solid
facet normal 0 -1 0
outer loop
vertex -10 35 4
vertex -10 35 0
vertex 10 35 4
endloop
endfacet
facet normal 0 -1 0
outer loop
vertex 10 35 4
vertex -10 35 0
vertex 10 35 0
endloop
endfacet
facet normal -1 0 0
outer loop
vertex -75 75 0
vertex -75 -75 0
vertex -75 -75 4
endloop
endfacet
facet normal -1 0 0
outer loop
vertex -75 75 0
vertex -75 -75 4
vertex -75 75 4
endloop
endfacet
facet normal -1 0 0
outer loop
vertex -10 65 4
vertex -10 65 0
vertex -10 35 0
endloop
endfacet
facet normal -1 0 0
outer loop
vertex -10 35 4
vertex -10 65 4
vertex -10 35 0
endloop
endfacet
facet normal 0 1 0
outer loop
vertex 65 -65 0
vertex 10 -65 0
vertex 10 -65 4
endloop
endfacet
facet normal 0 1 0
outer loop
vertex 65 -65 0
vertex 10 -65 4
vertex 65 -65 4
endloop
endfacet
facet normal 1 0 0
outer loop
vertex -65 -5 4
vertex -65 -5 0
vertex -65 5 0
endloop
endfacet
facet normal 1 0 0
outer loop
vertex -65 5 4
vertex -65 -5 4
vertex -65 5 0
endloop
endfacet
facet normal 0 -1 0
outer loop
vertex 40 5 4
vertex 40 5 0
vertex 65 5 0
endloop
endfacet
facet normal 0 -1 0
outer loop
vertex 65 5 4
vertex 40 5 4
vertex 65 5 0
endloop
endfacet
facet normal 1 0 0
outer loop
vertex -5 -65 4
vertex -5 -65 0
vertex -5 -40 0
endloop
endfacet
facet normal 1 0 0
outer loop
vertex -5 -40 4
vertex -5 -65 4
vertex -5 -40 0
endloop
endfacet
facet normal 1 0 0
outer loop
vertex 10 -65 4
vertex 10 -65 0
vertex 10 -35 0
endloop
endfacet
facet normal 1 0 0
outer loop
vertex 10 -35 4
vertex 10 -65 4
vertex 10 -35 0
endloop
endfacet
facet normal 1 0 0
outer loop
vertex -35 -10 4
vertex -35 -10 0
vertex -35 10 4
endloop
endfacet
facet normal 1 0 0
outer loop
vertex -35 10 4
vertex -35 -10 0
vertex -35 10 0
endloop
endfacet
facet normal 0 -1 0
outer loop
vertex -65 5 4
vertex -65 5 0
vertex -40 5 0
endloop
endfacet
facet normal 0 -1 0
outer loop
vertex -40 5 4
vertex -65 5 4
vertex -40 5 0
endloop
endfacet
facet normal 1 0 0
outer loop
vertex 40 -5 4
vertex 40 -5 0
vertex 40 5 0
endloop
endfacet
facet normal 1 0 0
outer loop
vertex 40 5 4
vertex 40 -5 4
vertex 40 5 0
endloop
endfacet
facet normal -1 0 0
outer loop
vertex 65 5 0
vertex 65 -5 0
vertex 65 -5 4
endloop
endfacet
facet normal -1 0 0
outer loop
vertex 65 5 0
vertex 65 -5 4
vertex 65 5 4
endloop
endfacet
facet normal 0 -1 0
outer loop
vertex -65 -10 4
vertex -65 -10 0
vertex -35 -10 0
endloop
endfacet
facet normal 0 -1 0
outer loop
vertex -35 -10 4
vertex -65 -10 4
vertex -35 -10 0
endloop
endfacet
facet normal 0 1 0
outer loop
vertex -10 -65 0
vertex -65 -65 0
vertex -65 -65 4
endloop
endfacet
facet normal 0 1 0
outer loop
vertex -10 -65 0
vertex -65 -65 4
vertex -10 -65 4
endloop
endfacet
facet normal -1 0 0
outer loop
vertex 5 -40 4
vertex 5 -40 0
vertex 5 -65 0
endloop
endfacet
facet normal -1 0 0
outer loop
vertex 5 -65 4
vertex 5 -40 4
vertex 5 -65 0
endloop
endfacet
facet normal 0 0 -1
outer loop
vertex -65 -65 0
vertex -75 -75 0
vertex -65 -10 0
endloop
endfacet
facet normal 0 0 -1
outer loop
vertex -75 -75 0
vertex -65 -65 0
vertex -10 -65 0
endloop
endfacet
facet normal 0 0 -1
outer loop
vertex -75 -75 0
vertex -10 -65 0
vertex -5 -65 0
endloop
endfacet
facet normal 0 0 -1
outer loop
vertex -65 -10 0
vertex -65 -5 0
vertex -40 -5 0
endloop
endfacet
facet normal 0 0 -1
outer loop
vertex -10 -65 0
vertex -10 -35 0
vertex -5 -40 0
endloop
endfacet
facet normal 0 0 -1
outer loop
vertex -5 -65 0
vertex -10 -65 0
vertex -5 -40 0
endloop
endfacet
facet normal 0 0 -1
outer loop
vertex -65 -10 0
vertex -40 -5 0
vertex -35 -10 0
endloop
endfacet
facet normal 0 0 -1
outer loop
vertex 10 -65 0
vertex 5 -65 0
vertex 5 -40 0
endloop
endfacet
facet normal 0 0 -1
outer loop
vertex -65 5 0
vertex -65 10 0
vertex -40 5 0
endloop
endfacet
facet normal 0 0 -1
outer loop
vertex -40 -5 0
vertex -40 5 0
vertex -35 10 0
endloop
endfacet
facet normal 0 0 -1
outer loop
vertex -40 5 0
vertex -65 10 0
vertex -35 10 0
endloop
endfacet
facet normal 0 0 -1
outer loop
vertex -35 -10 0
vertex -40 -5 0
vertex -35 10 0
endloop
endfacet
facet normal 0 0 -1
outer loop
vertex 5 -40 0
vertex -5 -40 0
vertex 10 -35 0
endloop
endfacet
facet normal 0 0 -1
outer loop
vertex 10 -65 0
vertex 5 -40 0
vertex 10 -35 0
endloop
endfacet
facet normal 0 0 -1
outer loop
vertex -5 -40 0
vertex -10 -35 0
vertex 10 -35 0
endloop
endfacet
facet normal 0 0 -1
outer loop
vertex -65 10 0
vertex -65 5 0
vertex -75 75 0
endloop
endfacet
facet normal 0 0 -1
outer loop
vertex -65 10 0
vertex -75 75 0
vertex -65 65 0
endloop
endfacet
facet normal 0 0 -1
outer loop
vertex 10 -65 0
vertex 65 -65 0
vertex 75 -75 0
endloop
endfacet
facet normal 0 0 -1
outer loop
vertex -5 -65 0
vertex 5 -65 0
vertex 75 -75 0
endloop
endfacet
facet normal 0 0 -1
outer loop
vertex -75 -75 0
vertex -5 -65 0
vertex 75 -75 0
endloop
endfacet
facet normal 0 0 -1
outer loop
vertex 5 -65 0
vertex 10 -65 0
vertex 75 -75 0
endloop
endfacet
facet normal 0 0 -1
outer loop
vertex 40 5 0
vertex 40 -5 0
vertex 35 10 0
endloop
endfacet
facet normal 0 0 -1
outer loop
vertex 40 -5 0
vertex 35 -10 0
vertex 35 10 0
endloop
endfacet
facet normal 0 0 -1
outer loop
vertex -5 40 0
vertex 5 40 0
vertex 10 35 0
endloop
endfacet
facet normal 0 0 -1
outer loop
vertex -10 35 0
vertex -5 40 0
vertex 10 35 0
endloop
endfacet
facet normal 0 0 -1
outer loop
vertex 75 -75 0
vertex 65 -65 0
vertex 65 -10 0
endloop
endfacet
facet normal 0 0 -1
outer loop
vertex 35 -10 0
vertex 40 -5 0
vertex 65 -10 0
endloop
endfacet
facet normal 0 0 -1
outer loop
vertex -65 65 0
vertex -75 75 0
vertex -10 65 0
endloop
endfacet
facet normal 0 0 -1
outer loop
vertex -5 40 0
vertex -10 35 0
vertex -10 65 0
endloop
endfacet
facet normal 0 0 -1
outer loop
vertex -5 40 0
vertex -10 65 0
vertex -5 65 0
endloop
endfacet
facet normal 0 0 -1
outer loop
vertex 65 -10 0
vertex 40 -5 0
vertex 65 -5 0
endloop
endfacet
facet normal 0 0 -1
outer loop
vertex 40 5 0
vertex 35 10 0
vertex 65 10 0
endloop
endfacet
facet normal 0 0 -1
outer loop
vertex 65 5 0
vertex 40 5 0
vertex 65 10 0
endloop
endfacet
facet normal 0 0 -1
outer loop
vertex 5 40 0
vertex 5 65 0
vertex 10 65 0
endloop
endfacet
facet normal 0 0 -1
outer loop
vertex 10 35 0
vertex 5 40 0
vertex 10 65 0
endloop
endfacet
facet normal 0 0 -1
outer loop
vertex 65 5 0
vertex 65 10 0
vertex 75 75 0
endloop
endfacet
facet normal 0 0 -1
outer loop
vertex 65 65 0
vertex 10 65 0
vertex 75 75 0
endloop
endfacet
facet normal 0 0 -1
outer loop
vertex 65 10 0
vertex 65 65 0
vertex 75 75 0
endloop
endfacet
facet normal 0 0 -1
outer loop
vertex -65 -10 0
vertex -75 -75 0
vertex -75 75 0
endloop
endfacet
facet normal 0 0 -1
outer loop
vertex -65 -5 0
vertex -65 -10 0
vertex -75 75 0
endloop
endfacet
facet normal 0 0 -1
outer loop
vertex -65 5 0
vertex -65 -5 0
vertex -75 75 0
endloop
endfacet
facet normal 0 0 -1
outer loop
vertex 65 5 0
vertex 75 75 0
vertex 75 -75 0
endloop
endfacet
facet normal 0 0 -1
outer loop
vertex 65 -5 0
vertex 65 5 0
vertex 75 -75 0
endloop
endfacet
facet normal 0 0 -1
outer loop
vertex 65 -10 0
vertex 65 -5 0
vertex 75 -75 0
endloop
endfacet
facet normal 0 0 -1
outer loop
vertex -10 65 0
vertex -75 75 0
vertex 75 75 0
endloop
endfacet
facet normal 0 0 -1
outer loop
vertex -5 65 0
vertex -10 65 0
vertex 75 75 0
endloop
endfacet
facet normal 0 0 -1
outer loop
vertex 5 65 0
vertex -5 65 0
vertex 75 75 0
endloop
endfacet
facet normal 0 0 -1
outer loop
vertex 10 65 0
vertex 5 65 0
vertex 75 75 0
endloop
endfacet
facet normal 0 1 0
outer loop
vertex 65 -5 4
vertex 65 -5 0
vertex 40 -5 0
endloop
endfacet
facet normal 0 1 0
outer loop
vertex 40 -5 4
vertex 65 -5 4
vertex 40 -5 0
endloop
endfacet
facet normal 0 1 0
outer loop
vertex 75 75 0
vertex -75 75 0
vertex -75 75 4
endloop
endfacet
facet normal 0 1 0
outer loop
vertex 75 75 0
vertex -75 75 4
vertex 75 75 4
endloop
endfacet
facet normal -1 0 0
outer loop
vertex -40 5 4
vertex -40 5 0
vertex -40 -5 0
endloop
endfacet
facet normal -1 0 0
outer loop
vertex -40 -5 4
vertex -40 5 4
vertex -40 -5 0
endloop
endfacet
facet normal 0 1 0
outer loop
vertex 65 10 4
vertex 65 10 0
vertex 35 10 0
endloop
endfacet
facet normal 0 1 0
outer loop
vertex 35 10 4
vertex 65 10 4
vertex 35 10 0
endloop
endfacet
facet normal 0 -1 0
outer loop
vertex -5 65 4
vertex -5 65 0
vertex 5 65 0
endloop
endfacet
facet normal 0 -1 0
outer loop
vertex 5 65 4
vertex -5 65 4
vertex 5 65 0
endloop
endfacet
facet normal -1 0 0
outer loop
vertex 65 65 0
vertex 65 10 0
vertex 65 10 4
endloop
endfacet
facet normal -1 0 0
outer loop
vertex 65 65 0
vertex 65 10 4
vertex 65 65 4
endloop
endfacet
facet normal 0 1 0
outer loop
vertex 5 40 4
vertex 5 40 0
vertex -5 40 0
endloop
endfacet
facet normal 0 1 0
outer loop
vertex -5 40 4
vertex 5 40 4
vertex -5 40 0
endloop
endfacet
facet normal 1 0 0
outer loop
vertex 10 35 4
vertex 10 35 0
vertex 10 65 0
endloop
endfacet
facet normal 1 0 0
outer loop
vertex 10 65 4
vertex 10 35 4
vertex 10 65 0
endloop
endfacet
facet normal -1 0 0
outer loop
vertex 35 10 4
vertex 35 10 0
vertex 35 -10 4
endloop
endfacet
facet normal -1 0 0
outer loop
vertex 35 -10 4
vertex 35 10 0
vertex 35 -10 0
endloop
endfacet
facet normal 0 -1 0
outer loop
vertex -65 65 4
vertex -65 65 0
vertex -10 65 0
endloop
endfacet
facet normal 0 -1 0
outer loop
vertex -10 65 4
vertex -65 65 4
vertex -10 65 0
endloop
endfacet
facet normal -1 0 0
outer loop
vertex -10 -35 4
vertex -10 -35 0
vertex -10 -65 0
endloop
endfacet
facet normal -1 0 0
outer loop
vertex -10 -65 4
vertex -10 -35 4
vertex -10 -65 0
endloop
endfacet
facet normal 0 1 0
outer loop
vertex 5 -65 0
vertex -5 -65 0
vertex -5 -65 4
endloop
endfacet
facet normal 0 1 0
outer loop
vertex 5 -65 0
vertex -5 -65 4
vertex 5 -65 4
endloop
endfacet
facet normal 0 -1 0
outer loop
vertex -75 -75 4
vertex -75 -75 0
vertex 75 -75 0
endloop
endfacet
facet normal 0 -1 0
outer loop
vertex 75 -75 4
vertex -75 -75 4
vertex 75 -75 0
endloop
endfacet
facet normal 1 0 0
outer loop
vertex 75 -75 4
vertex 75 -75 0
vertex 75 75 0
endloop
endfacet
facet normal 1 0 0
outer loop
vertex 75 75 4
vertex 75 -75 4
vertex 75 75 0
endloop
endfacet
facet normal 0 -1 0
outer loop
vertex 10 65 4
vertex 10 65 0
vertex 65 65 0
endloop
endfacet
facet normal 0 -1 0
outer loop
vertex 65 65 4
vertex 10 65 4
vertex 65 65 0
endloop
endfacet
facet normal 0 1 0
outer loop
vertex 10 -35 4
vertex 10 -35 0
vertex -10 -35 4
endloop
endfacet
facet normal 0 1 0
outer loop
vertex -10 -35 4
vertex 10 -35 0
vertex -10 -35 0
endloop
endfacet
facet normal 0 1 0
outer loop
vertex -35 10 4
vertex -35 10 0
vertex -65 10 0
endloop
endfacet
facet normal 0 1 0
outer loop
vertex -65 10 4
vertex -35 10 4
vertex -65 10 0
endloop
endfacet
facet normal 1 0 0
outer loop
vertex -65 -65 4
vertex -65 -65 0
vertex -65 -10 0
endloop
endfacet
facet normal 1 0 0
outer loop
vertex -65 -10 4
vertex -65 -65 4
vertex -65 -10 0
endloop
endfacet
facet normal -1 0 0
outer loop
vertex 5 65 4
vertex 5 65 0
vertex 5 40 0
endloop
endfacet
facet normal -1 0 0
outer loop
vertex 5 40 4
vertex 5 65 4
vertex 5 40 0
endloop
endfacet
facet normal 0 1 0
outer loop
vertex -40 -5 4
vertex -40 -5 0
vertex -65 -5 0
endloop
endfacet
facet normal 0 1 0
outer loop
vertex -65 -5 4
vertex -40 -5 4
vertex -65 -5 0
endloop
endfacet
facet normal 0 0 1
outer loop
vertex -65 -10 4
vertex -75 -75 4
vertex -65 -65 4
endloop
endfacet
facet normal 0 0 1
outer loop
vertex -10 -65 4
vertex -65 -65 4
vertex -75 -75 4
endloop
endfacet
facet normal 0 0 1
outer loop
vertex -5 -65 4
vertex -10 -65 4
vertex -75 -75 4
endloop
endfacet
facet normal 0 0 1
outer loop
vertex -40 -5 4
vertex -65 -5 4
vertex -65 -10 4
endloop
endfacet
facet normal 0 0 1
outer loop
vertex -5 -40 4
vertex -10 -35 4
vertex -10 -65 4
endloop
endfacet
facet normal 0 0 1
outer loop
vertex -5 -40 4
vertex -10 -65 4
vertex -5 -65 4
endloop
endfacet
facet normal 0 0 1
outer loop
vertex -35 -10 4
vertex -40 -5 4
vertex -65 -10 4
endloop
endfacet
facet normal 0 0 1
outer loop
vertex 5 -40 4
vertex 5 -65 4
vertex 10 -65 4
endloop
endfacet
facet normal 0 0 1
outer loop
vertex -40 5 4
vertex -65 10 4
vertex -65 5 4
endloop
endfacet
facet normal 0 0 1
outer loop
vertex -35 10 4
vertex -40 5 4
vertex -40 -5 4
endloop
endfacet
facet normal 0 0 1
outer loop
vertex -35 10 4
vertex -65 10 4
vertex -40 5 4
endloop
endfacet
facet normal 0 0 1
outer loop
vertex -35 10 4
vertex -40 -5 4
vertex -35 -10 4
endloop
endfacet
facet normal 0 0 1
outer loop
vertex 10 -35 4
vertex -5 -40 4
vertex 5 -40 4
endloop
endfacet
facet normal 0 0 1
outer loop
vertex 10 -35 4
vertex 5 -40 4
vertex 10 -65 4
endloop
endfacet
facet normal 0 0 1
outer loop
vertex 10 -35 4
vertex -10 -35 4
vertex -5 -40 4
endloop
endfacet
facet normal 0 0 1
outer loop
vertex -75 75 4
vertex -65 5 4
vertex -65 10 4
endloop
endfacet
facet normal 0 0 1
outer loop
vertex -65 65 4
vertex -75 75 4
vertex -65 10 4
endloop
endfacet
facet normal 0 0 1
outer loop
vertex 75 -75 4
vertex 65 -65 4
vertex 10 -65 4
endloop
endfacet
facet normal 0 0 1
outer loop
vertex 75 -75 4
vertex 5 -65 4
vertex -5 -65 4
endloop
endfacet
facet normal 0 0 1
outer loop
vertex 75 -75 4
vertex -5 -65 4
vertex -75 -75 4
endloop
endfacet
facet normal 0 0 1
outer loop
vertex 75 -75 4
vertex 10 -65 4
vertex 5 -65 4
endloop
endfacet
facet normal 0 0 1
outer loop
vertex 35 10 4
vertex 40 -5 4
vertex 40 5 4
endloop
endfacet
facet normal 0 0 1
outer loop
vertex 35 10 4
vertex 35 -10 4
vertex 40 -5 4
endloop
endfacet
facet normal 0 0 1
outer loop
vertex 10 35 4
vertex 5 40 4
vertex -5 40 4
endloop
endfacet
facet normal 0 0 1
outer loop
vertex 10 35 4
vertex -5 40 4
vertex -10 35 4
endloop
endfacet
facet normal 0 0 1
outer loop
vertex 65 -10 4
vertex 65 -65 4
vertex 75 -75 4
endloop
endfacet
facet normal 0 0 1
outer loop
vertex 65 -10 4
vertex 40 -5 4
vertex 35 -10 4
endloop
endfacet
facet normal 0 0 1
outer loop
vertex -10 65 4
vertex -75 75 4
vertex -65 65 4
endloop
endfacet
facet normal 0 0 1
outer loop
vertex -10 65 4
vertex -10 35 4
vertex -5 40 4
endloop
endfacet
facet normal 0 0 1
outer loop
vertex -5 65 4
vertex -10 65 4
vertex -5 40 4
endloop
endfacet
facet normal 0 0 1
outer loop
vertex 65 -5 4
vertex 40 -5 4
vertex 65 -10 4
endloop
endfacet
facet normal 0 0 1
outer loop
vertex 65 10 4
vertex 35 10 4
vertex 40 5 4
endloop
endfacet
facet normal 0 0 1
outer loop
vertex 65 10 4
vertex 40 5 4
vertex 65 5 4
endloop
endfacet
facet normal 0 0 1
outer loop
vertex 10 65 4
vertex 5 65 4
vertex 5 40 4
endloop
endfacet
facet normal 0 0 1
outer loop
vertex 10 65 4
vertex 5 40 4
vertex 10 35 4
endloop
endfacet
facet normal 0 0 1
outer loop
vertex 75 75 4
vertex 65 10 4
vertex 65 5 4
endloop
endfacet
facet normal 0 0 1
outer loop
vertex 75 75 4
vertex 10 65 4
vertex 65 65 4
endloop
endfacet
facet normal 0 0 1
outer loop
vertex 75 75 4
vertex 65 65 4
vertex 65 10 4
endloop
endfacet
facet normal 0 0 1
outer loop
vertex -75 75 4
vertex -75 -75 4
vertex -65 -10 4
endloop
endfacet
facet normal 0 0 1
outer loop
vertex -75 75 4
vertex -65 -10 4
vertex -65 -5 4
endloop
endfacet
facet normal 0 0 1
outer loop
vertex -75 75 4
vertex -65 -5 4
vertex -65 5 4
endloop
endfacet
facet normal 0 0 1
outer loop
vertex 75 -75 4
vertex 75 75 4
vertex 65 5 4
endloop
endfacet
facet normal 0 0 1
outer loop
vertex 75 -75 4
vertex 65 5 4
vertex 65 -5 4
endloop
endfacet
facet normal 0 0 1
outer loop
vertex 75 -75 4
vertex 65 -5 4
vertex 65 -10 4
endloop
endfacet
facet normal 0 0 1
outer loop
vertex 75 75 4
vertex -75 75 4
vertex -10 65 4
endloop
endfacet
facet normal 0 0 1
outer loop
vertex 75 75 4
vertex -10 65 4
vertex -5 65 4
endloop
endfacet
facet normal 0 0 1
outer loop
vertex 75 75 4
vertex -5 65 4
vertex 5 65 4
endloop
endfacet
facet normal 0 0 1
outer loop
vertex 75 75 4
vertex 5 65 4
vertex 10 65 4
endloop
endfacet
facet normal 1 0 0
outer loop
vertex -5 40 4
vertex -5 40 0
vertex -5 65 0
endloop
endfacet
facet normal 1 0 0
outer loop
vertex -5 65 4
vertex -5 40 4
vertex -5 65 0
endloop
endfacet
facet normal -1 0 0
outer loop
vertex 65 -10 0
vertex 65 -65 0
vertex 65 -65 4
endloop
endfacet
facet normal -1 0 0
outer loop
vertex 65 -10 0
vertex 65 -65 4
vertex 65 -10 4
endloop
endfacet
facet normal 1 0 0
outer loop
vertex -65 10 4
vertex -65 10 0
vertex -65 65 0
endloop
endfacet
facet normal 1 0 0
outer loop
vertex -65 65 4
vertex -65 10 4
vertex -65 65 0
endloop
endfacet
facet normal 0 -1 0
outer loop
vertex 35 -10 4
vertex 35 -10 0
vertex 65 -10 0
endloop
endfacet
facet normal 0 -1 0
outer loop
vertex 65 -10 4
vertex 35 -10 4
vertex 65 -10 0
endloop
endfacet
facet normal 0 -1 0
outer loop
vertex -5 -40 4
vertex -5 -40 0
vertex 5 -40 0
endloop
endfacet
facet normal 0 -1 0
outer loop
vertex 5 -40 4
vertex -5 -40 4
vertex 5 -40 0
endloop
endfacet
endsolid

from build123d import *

# Parameters (mm, degrees)
F0_W     = 150
F0_H     = 150
F0_W_2   = 130
F0_H_2   = 130
F1_DEPTH = 4
F3_DEPTH = 4


with BuildPart() as f1:
    # F0 (on Top) → F1 (new body)
    with BuildSketch(Plane.XY):
        Rectangle(F0_W, F0_H)
        Rectangle(F0_W_2, F0_H_2, mode=Mode.SUBTRACT)
    extrude(amount=F1_DEPTH)

    # F2 (on Top) → F3 (join, through all)
    with BuildSketch(Plane.XY):
        Polygon((-35, 10), (-65, 10), (-65, 5), (-40, 5), (-40, -5), (-65, -5), (-65, -10), (-35, -10), align=None)
        Polygon((-5, 65), (-10, 65), (-10, 35), (10, 35), (10, 65), (5, 65), (5, 40), (-5, 40), align=None)
        Polygon((65, 5), (65, 10), (35, 10), (35, -10), (65, -10), (65, -5), (40, -5), (40, 5), align=None)
        Polygon((5, -65), (10, -65), (10, -35), (-10, -35), (-10, -65), (-5, -65), (-5, -40), (5, -40), align=None)
    extrude(amount=F3_DEPTH)


solid = f1.part
